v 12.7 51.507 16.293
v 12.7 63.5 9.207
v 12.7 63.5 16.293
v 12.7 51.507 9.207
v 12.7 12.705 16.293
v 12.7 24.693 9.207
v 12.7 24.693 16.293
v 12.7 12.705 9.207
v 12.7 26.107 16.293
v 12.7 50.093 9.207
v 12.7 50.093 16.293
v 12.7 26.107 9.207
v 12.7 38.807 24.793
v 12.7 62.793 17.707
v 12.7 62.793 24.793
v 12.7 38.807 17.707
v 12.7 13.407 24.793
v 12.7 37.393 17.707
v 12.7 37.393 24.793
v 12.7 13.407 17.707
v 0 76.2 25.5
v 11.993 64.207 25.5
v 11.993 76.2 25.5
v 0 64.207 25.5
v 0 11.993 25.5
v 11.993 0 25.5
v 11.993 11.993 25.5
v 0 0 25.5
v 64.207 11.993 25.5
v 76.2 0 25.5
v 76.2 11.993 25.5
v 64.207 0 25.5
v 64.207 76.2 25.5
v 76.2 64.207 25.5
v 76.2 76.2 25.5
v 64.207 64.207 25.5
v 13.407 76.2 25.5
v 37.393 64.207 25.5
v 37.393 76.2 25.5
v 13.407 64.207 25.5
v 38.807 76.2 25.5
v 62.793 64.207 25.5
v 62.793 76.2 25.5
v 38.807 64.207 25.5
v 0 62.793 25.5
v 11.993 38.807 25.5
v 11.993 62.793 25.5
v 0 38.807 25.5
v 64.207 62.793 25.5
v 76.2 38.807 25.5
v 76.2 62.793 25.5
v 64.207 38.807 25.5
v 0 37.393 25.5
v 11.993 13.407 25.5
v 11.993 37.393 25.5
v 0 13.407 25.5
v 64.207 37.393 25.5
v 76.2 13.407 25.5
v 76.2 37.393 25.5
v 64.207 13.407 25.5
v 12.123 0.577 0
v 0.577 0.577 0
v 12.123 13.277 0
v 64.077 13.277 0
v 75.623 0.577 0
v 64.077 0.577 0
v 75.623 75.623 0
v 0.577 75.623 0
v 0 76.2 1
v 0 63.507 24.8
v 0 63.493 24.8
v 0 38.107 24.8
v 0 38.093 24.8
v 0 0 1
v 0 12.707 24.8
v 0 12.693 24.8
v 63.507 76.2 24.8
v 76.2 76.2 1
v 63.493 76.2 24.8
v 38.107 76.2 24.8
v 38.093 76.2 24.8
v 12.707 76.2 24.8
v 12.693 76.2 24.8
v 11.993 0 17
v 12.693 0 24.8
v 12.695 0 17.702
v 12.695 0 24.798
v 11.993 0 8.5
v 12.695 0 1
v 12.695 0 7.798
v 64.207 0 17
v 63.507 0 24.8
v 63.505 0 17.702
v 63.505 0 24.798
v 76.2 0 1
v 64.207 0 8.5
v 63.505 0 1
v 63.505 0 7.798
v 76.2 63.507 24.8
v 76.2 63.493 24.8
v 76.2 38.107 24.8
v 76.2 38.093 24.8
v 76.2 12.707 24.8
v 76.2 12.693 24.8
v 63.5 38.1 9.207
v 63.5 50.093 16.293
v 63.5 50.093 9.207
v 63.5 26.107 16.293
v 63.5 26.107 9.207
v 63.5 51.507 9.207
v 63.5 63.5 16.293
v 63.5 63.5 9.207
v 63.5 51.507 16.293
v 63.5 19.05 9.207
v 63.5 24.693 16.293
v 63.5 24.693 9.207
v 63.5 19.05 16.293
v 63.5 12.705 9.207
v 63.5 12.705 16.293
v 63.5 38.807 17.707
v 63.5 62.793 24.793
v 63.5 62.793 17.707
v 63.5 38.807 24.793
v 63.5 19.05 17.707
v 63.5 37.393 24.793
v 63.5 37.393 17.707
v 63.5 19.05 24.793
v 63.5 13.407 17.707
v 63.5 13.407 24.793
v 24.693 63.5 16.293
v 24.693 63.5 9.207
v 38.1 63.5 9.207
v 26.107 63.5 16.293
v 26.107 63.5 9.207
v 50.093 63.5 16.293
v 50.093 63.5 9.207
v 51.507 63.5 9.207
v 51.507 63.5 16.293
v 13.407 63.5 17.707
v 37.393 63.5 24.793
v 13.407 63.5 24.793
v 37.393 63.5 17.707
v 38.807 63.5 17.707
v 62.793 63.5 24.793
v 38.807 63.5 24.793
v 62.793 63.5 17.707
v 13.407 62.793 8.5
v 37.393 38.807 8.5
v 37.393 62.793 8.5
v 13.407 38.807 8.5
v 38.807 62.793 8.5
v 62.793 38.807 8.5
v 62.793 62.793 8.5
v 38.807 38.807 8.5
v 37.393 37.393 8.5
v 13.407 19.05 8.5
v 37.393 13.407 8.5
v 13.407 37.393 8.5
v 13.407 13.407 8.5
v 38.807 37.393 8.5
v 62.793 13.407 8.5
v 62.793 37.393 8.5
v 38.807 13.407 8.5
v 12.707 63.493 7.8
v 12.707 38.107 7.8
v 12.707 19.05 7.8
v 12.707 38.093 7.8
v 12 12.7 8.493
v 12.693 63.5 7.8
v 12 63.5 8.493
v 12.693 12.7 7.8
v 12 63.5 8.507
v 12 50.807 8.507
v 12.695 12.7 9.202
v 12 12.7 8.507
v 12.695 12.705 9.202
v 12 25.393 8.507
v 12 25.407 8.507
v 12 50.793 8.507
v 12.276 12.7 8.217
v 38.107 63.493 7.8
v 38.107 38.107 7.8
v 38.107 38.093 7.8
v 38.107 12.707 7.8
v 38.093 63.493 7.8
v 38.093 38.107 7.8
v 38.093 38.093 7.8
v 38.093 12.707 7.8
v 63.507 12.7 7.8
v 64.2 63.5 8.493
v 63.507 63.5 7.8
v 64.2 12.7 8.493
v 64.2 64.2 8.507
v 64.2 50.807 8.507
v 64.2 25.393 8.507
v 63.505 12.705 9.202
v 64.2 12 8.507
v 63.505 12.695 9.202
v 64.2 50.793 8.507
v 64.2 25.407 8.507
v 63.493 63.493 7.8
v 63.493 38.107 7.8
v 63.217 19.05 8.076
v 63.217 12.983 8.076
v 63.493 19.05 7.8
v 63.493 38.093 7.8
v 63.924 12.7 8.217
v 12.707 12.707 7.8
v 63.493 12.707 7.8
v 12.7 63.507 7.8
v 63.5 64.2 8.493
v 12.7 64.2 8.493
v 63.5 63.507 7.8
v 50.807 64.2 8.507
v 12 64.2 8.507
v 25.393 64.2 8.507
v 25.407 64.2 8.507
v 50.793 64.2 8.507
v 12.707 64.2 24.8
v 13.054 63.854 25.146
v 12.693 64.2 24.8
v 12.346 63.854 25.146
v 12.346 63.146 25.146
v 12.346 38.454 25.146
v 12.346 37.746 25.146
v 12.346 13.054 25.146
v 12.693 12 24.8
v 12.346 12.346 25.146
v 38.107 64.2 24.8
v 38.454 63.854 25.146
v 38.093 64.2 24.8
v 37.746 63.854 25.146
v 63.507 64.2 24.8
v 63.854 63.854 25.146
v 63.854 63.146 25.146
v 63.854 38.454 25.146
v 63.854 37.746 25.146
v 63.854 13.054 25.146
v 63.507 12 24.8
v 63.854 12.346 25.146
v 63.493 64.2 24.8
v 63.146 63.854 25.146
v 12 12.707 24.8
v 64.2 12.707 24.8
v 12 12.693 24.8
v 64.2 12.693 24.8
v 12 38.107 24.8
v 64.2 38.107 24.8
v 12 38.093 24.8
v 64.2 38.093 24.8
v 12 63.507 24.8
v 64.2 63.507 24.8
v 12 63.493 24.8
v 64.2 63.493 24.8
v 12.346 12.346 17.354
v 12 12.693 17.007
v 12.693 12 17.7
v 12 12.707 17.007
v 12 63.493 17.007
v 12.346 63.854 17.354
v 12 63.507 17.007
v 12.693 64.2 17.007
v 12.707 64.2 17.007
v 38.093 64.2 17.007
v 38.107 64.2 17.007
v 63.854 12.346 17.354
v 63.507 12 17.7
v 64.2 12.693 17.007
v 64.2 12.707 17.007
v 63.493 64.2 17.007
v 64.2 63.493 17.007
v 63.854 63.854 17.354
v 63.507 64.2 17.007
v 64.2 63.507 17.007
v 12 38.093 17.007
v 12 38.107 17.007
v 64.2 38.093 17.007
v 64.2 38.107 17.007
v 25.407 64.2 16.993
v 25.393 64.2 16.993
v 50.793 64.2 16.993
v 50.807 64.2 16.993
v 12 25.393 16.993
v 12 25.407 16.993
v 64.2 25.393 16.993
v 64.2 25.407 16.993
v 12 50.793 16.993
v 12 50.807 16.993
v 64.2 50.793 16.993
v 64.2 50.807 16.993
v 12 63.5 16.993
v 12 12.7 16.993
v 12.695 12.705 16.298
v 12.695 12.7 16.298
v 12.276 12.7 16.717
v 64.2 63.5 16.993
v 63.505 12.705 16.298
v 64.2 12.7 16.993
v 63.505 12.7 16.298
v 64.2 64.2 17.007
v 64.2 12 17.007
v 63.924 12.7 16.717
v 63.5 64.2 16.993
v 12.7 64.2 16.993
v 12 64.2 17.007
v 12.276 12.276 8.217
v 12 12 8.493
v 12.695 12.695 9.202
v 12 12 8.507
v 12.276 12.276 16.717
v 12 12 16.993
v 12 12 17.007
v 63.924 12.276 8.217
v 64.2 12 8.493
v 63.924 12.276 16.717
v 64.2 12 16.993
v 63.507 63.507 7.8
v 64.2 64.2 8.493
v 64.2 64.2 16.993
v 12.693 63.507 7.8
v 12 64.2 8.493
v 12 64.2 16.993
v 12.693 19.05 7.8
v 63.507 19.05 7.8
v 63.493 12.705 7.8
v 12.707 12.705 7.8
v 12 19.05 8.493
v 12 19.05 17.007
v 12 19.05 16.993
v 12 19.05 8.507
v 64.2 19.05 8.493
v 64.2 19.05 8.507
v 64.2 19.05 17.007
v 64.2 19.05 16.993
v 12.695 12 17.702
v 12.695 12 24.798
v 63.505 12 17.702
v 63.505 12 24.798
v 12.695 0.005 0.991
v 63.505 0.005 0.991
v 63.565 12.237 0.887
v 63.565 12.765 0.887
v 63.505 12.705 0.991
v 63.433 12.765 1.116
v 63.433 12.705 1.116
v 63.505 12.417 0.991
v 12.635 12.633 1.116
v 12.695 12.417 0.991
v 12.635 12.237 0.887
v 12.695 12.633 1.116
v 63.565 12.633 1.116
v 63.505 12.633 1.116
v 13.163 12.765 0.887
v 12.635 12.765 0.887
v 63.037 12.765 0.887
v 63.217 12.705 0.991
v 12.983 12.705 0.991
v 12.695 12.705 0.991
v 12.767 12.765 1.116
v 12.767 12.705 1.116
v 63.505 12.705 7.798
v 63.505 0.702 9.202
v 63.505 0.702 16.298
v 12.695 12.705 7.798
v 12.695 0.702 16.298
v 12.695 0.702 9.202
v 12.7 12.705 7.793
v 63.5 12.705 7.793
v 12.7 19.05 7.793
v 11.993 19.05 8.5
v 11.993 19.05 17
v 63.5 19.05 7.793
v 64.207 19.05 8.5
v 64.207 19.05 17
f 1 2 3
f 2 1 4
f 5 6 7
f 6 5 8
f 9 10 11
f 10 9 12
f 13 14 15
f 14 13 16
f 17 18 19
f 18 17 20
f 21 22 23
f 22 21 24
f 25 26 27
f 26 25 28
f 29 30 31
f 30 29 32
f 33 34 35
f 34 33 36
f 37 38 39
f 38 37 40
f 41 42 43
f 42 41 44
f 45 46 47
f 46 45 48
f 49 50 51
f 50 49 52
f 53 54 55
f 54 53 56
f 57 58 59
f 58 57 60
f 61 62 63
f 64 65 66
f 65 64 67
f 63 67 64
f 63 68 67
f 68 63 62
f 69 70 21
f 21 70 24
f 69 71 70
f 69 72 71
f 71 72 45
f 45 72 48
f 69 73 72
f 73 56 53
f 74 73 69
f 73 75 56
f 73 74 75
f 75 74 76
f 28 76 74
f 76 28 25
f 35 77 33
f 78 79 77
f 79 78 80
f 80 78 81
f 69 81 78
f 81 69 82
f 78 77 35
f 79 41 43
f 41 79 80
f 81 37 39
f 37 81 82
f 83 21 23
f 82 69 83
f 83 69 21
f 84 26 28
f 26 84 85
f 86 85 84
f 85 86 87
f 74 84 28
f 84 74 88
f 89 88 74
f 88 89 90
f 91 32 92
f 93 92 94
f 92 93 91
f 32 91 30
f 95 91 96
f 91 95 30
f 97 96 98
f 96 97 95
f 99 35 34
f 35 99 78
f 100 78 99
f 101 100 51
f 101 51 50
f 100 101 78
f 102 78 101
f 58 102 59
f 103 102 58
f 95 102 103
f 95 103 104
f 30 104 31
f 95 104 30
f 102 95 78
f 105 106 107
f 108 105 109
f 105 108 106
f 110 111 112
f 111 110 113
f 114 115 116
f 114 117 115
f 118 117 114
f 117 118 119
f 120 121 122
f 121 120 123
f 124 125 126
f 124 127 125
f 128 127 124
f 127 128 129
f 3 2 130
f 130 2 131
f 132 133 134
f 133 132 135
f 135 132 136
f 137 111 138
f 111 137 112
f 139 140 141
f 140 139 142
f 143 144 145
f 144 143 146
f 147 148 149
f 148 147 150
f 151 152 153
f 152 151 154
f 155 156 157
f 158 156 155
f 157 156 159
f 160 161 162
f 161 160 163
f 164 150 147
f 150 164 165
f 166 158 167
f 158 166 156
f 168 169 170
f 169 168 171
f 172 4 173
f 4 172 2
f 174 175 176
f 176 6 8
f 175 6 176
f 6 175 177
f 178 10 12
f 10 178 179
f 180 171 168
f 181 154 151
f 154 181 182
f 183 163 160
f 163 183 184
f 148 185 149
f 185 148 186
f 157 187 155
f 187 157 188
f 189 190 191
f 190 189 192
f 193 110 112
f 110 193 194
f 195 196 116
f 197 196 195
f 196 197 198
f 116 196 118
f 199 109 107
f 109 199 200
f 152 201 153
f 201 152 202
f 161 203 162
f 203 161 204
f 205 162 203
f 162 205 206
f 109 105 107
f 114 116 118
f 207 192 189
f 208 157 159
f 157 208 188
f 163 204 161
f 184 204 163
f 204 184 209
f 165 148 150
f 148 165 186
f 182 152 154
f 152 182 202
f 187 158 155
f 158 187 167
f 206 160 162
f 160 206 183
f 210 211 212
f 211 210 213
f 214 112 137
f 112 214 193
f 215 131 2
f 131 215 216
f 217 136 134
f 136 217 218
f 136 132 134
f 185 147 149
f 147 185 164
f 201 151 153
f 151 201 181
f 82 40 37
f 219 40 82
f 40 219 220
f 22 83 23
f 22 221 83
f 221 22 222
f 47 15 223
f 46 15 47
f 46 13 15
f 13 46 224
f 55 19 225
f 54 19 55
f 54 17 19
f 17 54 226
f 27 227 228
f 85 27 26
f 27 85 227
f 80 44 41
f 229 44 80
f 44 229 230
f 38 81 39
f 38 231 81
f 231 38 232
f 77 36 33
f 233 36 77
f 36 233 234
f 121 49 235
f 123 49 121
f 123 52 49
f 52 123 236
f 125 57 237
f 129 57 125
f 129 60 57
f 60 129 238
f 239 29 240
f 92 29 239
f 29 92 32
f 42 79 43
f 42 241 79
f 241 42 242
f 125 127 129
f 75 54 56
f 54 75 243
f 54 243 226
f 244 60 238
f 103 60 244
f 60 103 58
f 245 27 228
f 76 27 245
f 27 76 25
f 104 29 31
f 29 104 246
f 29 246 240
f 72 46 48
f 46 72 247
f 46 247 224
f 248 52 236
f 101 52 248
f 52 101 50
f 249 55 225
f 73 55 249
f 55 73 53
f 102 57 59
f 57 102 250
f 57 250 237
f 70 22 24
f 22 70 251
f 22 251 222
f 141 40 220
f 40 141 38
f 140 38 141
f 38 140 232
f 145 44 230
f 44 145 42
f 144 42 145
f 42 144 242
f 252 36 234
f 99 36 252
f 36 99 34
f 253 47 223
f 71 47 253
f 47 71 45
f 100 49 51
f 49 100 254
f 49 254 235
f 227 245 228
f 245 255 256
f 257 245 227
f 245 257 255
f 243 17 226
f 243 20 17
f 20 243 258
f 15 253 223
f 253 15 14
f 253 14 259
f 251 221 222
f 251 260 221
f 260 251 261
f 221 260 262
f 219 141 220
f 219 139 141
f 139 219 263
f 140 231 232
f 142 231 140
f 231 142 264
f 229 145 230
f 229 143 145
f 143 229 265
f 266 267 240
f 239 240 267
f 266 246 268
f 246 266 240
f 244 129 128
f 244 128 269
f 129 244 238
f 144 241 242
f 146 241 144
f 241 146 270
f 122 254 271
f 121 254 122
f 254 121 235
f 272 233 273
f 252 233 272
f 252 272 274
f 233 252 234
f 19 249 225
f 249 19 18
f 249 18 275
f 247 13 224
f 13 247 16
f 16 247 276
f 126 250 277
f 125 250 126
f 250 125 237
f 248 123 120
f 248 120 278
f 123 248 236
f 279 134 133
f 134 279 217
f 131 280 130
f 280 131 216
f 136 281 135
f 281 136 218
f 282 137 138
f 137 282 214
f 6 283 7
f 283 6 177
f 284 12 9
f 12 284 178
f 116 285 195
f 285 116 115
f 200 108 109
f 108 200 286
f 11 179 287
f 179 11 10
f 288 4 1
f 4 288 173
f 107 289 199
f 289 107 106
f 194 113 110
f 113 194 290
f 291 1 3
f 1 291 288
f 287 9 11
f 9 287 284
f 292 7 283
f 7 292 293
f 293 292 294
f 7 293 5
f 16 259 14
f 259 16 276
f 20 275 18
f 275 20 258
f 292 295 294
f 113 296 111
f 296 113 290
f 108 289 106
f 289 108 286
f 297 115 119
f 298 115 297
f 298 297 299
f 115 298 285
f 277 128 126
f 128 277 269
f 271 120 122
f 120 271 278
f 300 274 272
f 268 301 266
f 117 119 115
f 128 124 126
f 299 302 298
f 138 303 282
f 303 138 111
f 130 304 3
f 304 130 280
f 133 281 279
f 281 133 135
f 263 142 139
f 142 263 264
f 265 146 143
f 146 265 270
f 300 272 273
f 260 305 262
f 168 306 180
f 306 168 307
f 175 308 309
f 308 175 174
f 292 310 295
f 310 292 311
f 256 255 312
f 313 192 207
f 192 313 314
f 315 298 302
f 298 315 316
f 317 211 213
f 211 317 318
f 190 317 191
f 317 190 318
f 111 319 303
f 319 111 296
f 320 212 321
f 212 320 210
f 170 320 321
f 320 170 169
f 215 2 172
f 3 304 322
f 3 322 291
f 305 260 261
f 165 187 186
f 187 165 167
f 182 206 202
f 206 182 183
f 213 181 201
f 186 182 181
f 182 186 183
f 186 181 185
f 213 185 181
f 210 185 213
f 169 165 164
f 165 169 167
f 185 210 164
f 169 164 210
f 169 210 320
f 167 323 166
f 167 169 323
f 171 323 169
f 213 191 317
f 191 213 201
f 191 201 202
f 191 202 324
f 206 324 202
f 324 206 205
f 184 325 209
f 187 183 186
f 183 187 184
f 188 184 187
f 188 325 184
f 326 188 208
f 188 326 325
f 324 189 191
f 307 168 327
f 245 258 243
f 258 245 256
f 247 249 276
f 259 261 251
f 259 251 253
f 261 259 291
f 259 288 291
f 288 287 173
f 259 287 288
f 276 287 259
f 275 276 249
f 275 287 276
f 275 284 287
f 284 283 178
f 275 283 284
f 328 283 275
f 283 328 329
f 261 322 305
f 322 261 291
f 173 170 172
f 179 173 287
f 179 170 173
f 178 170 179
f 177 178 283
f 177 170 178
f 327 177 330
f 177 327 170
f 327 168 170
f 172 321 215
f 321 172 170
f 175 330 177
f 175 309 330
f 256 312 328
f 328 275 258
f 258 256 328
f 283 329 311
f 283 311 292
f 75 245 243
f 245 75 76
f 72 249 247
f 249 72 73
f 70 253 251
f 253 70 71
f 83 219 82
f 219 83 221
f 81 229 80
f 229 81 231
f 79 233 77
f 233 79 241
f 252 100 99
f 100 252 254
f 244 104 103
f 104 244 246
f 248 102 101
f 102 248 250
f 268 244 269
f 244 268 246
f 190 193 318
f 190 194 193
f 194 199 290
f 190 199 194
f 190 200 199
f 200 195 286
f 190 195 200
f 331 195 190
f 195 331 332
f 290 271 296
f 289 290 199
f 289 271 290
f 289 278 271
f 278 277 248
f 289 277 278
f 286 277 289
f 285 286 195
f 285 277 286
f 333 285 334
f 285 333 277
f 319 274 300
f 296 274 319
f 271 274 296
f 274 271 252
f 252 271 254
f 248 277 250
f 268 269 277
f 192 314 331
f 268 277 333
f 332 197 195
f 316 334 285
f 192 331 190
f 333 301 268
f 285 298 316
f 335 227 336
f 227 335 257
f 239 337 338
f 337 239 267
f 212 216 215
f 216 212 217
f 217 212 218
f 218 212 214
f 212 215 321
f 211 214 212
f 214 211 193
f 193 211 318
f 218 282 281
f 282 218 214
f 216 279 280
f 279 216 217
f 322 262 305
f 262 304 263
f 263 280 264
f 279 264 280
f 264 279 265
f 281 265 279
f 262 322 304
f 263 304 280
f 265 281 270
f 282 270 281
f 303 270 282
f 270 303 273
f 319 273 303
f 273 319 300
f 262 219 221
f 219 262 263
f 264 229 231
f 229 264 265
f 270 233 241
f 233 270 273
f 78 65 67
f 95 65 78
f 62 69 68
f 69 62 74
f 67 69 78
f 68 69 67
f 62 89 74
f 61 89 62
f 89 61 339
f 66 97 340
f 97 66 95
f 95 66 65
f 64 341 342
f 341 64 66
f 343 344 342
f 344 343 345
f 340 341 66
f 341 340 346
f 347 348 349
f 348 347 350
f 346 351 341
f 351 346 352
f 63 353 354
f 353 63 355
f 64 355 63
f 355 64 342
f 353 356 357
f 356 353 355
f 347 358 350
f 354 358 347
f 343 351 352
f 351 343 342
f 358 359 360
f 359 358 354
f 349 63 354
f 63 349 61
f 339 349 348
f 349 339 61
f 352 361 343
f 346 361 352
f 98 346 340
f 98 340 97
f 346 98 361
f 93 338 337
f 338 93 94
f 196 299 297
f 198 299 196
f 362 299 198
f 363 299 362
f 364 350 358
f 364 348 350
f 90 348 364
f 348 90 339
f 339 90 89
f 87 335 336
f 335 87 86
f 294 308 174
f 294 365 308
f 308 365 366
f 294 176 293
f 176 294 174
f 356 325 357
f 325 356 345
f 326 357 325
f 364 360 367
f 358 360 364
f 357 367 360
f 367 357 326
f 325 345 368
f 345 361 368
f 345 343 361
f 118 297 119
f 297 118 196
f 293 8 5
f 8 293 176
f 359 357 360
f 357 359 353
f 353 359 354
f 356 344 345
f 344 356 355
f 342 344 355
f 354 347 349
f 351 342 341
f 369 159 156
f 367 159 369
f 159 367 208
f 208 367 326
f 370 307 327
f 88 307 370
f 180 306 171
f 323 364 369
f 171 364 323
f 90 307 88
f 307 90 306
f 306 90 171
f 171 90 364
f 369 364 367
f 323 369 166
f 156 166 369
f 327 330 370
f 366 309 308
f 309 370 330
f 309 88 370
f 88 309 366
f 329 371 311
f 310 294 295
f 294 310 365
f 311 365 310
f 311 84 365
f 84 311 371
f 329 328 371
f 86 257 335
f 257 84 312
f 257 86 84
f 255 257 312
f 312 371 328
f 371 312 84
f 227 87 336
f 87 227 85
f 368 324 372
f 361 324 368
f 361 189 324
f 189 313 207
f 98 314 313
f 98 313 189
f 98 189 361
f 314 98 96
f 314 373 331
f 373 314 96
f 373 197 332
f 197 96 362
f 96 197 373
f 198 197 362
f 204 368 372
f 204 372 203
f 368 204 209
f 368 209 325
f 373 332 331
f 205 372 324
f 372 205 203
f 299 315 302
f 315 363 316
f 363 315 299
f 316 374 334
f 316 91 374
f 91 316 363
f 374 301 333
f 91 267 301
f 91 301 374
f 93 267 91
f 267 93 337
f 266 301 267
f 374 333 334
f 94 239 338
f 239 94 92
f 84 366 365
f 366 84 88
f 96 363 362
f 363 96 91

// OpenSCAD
thickness=8.5;
roomx=2;
roomy=2;
inch=25.4;
groove=1;
ep=0.01;

difference()
{
    union()
    {
        difference()
        {
            union()
            {
                floor();
                wall();
            }
            floorgrid();
            wallgrid();
            cornerclean();
            for (ii=[0:1])
            {
                pock();
            }
        }
        backfill();
    }
    printable(); 
    translate([inch/2+inch,inch/2,0])door();
}




//%translate([inch/2+inch,inch/2,0])door();













module door()
{
    translate([0,-inch/2,thickness*2])cube([inch*2+ep,inch+ep,thickness*4+ep],center=true);
    translate([-inch,-inch/2,0])rotate([0,30,0])cube([groove,inch+.13,groove*2],center=true);
    translate([inch,-inch/2,0])rotate([0,60,0])cube([groove*2,inch+.13,groove],center=true);
    translate([0,0,0])rotate([30,0,0])cube([inch*2+.13,groove,groove*2],center=true);
    intersection()
    {
        translate([inch,-inch/2,0])rotate([0,60,0])cube([groove*2,inch*2,groove],center=true);
        translate([0,0,0])rotate([30,0,0])cube([inch*3+.13,groove,groove*2],center=true);
    }
    intersection()
    {
        translate([-inch,-inch/2,0])rotate([0,30,0])cube([groove,inch*2,groove*2],center=true);
        translate([0,0,0])rotate([30,0,0])cube([inch*3+.13,groove,groove*2],center=true);
    }
    //lines
    translate([-inch,-inch/4,thickness*1+(0*thickness)])rotate([0,45,0])cube([groove,inch,groove],center=true);
    translate([-inch,-inch/4,thickness*1+(1*thickness)])rotate([0,45,0])cube([groove,inch,groove],center=true);
    translate([-inch,-inch/4,thickness*1+(2*thickness)])rotate([0,45,0])cube([groove,inch,groove],center=true);
    
    //lines
    translate([inch,-inch/4,thickness*1+(0*thickness)])rotate([0,45,0])cube([groove,inch,groove],center=true);
    translate([inch,-inch/4,thickness*1+(1*thickness)])rotate([0,45,0])cube([groove,inch,groove],center=true);
    translate([inch,-inch/4,thickness*1+(2*thickness)])rotate([0,45,0])cube([groove,inch,groove],center=true);
    
    //verticals
    translate([-inch,-inch/2,thickness*1+thickness/2])rotate([0,0,45])cube([groove,groove,thickness],center=true);
    translate([inch,-inch/2,thickness*1+thickness/2])rotate([0,0,45])cube([groove,groove,thickness],center=true);
}



module backfill()
{
//backfill
//depth of picks is .5
fill=.7;
translate([roomx*inch/2+inch/2,roomy*inch/2+inch/2,thickness/2-fill/2])cube([(roomx+1)*inch,(roomy+1)*inch,thickness-fill],center=true);

translate([inch/4-fill/2,(roomy+1)*inch/2,(thickness)*1.5-fill/2])cube([inch/2-fill,(roomy+1)*inch,thickness*3-fill],center=true);
translate([(roomx+1)*inch-inch/4+fill/2,(roomy+1)*inch/2,(thickness)*1.5-fill/2])cube([inch/2-fill,(roomy+1)*inch,thickness*3-fill],center=true);

translate([(roomx+1)*inch/2,inch/4-fill/2,thickness*1.5-fill/2])cube([(roomx+1)*inch,inch/2-fill,thickness*3-fill],center=true);
translate([(roomx+1)*inch/2,(roomy+1)*inch-inch/4+fill/2,thickness*1.5-fill/2])cube([(roomx+1)*inch,inch/2-fill,thickness*3-fill],center=true);
}

module printable()
{
    //30 degree angles
    translate([(roomx+1)*inch,(roomy+1)*inch/2,0])rotate([0,30,0])cube([groove,(1+roomy)*inch*2,groove*2],center=true);
    translate([0,(roomy+1)*inch/2,0])rotate([0,60,0])cube([groove*2,(roomy+1)*inch*2,groove],center=true);
    translate([(roomx+1)*inch/2,(1+roomy)*inch,0])rotate([60,0,0])cube([(1+roomx)*inch*2,groove*2,groove],center=true);
    translate([(roomx+1)*inch/2,0,0])rotate([30,0,0])cube([(1+roomx)*inch*2,groove,groove*2],center=true);
}
module pock()
{
    shapenum = floor(rands(0,16,1)[0])+1;
    angle=floor(rands(0,360,1)[0])+1;
    //map to unfolded
    xx=(roomx*inch+thickness*4+inch)*(rands(0,1,1)[0]);
    echo(xx);
    //xx=roomx*inch+inch/2+thickness*4;
    yy=(roomy*inch+thickness*4+inch)*(rands(0,1,1)[0]);
    echo(yy);
    //yy=inch/2+thickness*4+roomy*inch;
    
    //floor mapping
    floorx=xx-thickness*2;
    floory=yy-thickness*2;
    //floor
    translate([floorx,floory,thickness])rotate([0,0,angle])blemish(shapenum);
    //yaxis near
    
    yy1=yy-thickness*2;
    xx1=xx;
    intersection()
    {
        translate([xx1,yy1,thickness*3])rotate([0,0,angle])blemish(shapenum);
        translate([inch/4,roomy*inch/2+inch/2,thickness*2])cube([inch/2,roomy*inch,thickness*4],center=true);
    }
    //yaxis near wall
    yy2=yy-thickness*2;
    xx2=xx-inch/2;
    intersection()
    {
        translate([inch/2,0,thickness*3])rotate([0,90,0])translate([xx2,yy2,0])rotate([0,0,angle])blemish(shapenum);
        translate([inch/4,roomy*inch/2+inch/2,thickness*2])cube([inch,roomy*inch,thickness*4],center=true);
    }
    //edge near far y
    yy3=yy-thickness*2;
    xx3=xx-thickness*4;
    intersection()
    {
        translate([xx3,yy3,thickness*3])rotate([0,0,angle])blemish(shapenum);
        //translate([xx3,yy3,thickness*3])rotate([0,0,angle])cylinder(r=5,h=2,center=true);
        translate([(roomx+1)*inch-inch/4,roomy*inch/2+inch/2,thickness*2])cube([inch/2,roomy*inch,thickness*4],center=true);
    }
    //yaxis far wall
    yy4=yy-thickness*2;
    xx4=xx-(roomx)*inch-thickness*4-inch/2;
    intersection()
    {
        translate([(roomx+1)*inch-inch/2,0,thickness*3])rotate([0,-90,0])translate([xx4,yy4,0])rotate([0,0,angle])blemish(shapenum);
        //translate([(roomx+1)*inch-inch/2,0,thickness*3])rotate([0,-90,0])translate([xx4,yy4,0])rotate([0,0,angle])cylinder(r=5,h=2,center=true);
        translate([(roomx+1)*inch-inch/4,roomy*inch/2+inch/2,thickness*2])cube([inch,roomy*inch,thickness*4],center=true);
    }
    
    //near x axis
    yy5=yy;
    xx5=xx-thickness*2;
    intersection()
    {
        translate([xx5,yy5,thickness*3])rotate([0,0,angle])blemish(shapenum);
        translate([roomx*inch/2+inch/2,inch/4,thickness*2])cube([roomx*inch,inch/2,thickness*4],center=true);
    }
    yy6=yy-inch/2;
    xx6=xx-thickness*2;
    intersection()
    {
        translate([0,inch/2,thickness*3])rotate([270,0,0])translate([xx6,yy6,0])rotate([0,0,angle])blemish(shapenum);
        translate([roomx*inch/2+inch/2,inch/4,thickness*2])cube([roomx*inch,inch,thickness*4],center=true);
    }
    //far x axis
    yy7=yy-thickness*4;
    xx7=xx-thickness*2;
    intersection()
    {
        translate([xx7,yy7,thickness*3])rotate([0,0,angle])blemish(shapenum);
        translate([roomy*inch/2+inch/2,(roomy+1)*inch-inch/4,thickness*2])cube([roomx*inch,inch/2,thickness*4],center=true);
    }
    yy8=yy-(roomy)*inch-thickness*4-inch/2;
    xx8=xx-thickness*2;
    intersection()
    {
        translate([0,(roomx+1)*inch-inch/2,thickness*3])rotate([-270,0,0])translate([xx8,yy8,0])rotate([0,0,angle])blemish(shapenum);
        
        translate([roomx*inch/2+inch/2,(roomx+1)*inch-inch/4,thickness*2])cube([roomx*inch,inch,thickness*4],center=true);
    }
}

module floor()
{
    translate([roomx*inch/2+inch/2,roomy*inch/2+inch/2,thickness/2])cube([(roomx+1)*inch,(roomy+1)*inch,thickness],center=true);
}
module wall()
{
    translate([inch/4,(roomy+1)*inch/2,thickness*1.5])cube([inch/2,(roomy+1)*inch,thickness*3],center=true);
    translate([(roomx+1)*inch-inch/4,(roomy+1)*inch/2,thickness*1.5])cube([inch/2,(roomy+1)*inch,thickness*3],center=true);
    
    translate([(roomx+1)*inch/2,inch/4,thickness*1.5])cube([(roomx+1)*inch,inch/2,thickness*3],center=true);
    translate([(roomx+1)*inch/2,(roomy+1)*inch-inch/4,thickness*1.5])cube([(roomx+1)*inch,inch/2,thickness*3],center=true);
}
module floorgrid()
{
    for (ii=[0:roomx])
    {
        translate([ii*inch+inch/2,roomy*inch/2+inch/2,thickness])rotate([0,45,0])cube([groove,roomy*inch,groove],center=true);
    }
    for (ii=[0:roomy])
    {
        translate([roomx*inch/2+inch/2,ii*inch+inch/2,thickness])rotate([45,0,0])cube([roomx*inch,groove,groove],center=true);
    }
}
module wallgrid()
{
    //horizontal lines, y
    translate([inch/2,roomy*inch/2+inch/2,thickness*1+(0*thickness)])horyline();
    translate([inch/2,roomy*inch/2+inch/2,thickness*1+(1*thickness)])horyline();

    //horizontal lines, far y
    translate([roomx*inch+inch/2,roomy*inch/2+inch/2,thickness*1+(0*thickness)])horyline();
    translate([roomx*inch+inch/2,roomy*inch/2+inch/2,thickness*1+(1*thickness)])horyline();

    //horizontal lines, x
    translate([roomx*inch/2+inch/2,inch/2,thickness*1+(0*thickness)])horxling();
    translate([roomx*inch/2+inch/2,inch/2,thickness*1+(1*thickness)])horxling();

    //horizontal lines, far x
    translate([roomx*inch/2+inch/2,roomx*inch+inch/2,thickness*1+(0*thickness)])horxling();
    translate([roomx*inch/2+inch/2,roomx*inch+inch/2,thickness*1+(1*thickness)])horxling();
    

    for (ii=[0:roomx])
    {
        translate([ii*inch+inch/2,roomy*inch/2+inch/2,thickness*1+(2*thickness)])rotate([0,45,0])cube([groove,roomy*inch*2,groove],center=true); 
    }
    for (ii=[0:roomy])
    {
        translate([roomx*inch/2+inch/2,ii*inch+inch/2,thickness*1+(2*thickness)])rotate([45,0,0])cube([roomx*inch*2,groove,groove],center=true);
    }
    
    for (ii=[0:roomx])
    {
        translate([ii*inch,0,thickness*2])vertline();
        translate([ii*inch,roomy*inch,thickness*2])vertline();
    }
    for (ii=[0:roomy])
    {
        translate([0,ii*inch,thickness*2])vertline();
        translate([roomx*inch,ii*inch,thickness*2])vertline();
    }
    
    for (ii=[1:roomx])
    {
        translate([ii*inch-inch/2,0,thickness*1])vertline();
        translate([ii*inch-inch/2,roomy*inch,thickness*1])vertline();
    }
    for (ii=[1:roomy])
    {
        translate([0,ii*inch-inch/2,thickness*1])vertline();
        translate([roomx*inch,ii*inch-inch/2,thickness*1])vertline();
    }
}
module horxling()
{
    rotate([45,0,0])cube([roomx*inch,groove,groove],center=true);
}
module horyline()
{
    rotate([0,45,0])cube([groove,roomy*inch,groove],center=true);
}
module wallcorner()
{
    intersection()
    {
        rotate([45,0,0])cube([2*groove,groove,groove],center=true);
        rotate([0,45,0])cube([groove,2*groove,groove],center=true);
    }
}
module cornerclean()
{
    translate([inch/2,inch/2,thickness])wallcorner();
    translate([inch/2,inch/2,2*thickness])wallcorner();
    translate([roomx*inch+inch/2,inch/2,thickness])wallcorner();
    translate([roomx*inch+inch/2,inch/2,2*thickness])wallcorner();
    translate([roomx*inch+inch/2,roomy*inch+inch/2,thickness])wallcorner();
    translate([roomx*inch+inch/2,roomy*inch+inch/2,2*thickness])wallcorner();
    translate([inch/2,roomy*inch+inch/2,thickness])wallcorner();
    translate([inch/2,roomy*inch+inch/2,2*thickness])wallcorner();
}
module vertline()
{
    translate([inch/2,inch/2,thickness/2])rotate([0,0,45])cube([groove,groove,thickness],center=true);
}
module selectshape(shapenum)
{
    
    if (shapenum==1){ shape01(); }
    if (shapenum==2){ shape02(); }
    if (shapenum==3){ shape03(); }
    if (shapenum==4){ shape04(); }
    if (shapenum==5){ shape05(); }
    if (shapenum==6){ shape06(); }
    if (shapenum==7){ shape07(); }
    if (shapenum==8){ shape08(); }
    if (shapenum==9){ shape09(); }
    if (shapenum==10){ shape10(); }
    if (shapenum==11){ shape11(); }
    if (shapenum==12){ shape12(); }
    if (shapenum==13){ shape13(); }
    if (shapenum==14){ shape14(); }
    if (shapenum==15){ shape15(); }
    if (shapenum==16){ shape16(); }
}
module blemish(shapenum)
{
    
    {
        translate([0,0,-.5])linear_extrude(height=.101)selectshape(shapenum);
        translate([0,0,-.4])linear_extrude(height=.101)minkowski(){selectshape(shapenum); circle(r=.1);}
        translate([0,0,-.3])linear_extrude(height=.101)minkowski(){selectshape(shapenum); circle(r=.2);}
        translate([0,0,-.2])linear_extrude(height=.101)minkowski(){selectshape(shapenum); circle(r=.3);}
        translate([0,0,-.1])linear_extrude(height=.101)minkowski(){selectshape(shapenum); circle(r=.4);}
    }
}
module shape01()
{
    translate([-3,-2])scale(.8)import("blemish/shape001.dxf");
}
module shape02()
{
    translate([-3,-2])scale(.8)import("blemish/shape002.dxf");
}
module shape03()
{
    translate([-3,-2,0])scale(.8)import("blemish/shape003.dxf");
}
module shape04()
{
    translate([-14,-18,0])scale(.8)import("blemish/shape004.dxf");
}
module shape05()
{
    translate([-13,-10,0])scale(.8)import("blemish/shape005.dxf");
}
module shape06()
{
    translate([-2,-4,0])scale(.32)import("blemish/shape006.dxf");
}
module shape07()
{
    translate([-9,-9,0])scale(.3)import("blemish/shape007.dxf");
}
module shape08()
{
    translate([-6,-12,0])scale(.6)import("blemish/shape008.dxf");
}
module shape09()
{
    translate([-2,-2,0])scale(.2)import("blemish/shape009.dxf");
}
module shape10()
{
    translate([-1,-3,0])scale(.1)import("blemish/shape010.dxf");
}
module shape11()
{
    translate([-2,-4,0])scale(.3)import("blemish/shape011.dxf");
}
module shape12()
{
    translate([-6,-2,0])scale(.6)import("blemish/shape012.dxf");
}
module shape13()
{
    translate([-9,-14,0])scale(.7)import("blemish/shape013.dxf");
}
module shape14()
{
    translate([-0.5,-1,0])scale(.1)import("blemish/shape014.dxf");
}
module shape15()
{
    translate([-.5,-.5,0])scale(.1)import("blemish/shape015.dxf");
}
module shape16()
{
    translate([-6,-6,0])scale(.5)import("blemish/shape016.dxf");
}
